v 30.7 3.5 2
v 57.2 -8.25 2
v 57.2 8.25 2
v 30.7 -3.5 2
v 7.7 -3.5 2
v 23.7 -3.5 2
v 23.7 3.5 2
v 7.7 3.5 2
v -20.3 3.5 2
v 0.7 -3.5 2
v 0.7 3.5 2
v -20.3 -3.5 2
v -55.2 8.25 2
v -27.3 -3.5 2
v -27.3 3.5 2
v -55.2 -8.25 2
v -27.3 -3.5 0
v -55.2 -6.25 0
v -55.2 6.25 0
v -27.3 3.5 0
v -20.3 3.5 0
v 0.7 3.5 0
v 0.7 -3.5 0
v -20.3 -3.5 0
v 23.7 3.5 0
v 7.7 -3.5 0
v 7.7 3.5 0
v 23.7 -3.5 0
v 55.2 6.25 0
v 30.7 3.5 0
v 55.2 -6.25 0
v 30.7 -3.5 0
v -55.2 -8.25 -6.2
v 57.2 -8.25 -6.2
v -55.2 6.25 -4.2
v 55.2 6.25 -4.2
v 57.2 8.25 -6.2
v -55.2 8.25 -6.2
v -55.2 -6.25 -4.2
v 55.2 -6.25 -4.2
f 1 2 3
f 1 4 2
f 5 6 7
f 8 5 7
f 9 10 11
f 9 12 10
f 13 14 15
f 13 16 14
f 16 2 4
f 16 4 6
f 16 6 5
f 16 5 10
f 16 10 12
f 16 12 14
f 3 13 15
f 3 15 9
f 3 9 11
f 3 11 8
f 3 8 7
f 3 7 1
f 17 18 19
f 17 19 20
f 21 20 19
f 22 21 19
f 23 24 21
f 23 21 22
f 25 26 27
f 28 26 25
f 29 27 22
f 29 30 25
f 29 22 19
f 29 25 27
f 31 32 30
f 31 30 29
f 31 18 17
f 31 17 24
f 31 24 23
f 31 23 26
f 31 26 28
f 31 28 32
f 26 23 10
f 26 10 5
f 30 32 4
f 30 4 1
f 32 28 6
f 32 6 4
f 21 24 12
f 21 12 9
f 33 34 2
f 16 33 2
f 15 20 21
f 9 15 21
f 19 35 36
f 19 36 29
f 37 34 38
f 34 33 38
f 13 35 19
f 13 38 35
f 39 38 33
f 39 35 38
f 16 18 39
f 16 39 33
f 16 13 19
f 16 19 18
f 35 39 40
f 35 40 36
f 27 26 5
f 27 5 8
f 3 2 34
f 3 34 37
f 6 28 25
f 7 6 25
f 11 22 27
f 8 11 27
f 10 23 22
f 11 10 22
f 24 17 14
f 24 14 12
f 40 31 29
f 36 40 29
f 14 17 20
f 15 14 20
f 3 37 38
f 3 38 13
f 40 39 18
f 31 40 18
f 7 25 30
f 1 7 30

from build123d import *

# Parameters (mm, degrees)
F2_W     = 110.4
F2_H     = 12.5
F2_W_2   = 7
F2_H_2   = 7
F3_DEPTH = 2
F4_DEPTH = 2
F5_DEPTH = 2
F6_W     = 2
F6_H     = 4.2
F7_DEPTH = 110.4
F8_W     = 16.5
F8_H     = 8.2
F9_DEPTH = 2


with BuildPart() as f3:
    # F2 (on Top) → F3 (new body)
    with BuildSketch(Plane.XY):
        Rectangle(F2_W, F2_H)
        with Locations((-23.8, 0)):
            Rectangle(F2_W_2, F2_H_2, mode=Mode.SUBTRACT)
        with Locations((4.2, 0)):
            Rectangle(F2_W_2, F2_H_2, mode=Mode.SUBTRACT)
        with Locations((27.2, 0)):
            Rectangle(F2_W_2, F2_H_2, mode=Mode.SUBTRACT)
    extrude(amount=F3_DEPTH)

    # F4 (add): a face of the model
    f4_faces = [f3.faces().sort_by_distance(p)[0] for p in [
        (0, -6.25, 1),
    ]]
    extrude(f4_faces, amount=F4_DEPTH)

    # F5 (add): a face of the model
    f5_faces = [f3.faces().sort_by_distance(p)[0] for p in [
        (0, 6.25, 1),
    ]]
    extrude(f5_faces, amount=F5_DEPTH)

    # F6 (on face) → F7 (join)
    with BuildSketch(Plane(origin=(-55.2, 0, 0), x_dir=(0, -1, 0), z_dir=(-1, 0, 0))):
        with Locations((7.25, -2.1)):
            Rectangle(F6_W, F6_H)
        Polygon((-6.25, -4.2), (-8.25, -4.2), (-8.25, -6.2), (8.25, -6.2), (8.25, -4.2), (6.25, -4.2), align=None)
        with Locations((-7.25, -2.1)):
            Rectangle(F6_W, F6_H)
    extrude(amount=-F7_DEPTH)

    # F8 (on face) → F9 (join)
    with BuildSketch(Plane.YZ.offset(55.2)):
        with Locations((0, -2.1)):
            Rectangle(F8_W, F8_H)
    extrude(amount=F9_DEPTH)


solid = f3.part
